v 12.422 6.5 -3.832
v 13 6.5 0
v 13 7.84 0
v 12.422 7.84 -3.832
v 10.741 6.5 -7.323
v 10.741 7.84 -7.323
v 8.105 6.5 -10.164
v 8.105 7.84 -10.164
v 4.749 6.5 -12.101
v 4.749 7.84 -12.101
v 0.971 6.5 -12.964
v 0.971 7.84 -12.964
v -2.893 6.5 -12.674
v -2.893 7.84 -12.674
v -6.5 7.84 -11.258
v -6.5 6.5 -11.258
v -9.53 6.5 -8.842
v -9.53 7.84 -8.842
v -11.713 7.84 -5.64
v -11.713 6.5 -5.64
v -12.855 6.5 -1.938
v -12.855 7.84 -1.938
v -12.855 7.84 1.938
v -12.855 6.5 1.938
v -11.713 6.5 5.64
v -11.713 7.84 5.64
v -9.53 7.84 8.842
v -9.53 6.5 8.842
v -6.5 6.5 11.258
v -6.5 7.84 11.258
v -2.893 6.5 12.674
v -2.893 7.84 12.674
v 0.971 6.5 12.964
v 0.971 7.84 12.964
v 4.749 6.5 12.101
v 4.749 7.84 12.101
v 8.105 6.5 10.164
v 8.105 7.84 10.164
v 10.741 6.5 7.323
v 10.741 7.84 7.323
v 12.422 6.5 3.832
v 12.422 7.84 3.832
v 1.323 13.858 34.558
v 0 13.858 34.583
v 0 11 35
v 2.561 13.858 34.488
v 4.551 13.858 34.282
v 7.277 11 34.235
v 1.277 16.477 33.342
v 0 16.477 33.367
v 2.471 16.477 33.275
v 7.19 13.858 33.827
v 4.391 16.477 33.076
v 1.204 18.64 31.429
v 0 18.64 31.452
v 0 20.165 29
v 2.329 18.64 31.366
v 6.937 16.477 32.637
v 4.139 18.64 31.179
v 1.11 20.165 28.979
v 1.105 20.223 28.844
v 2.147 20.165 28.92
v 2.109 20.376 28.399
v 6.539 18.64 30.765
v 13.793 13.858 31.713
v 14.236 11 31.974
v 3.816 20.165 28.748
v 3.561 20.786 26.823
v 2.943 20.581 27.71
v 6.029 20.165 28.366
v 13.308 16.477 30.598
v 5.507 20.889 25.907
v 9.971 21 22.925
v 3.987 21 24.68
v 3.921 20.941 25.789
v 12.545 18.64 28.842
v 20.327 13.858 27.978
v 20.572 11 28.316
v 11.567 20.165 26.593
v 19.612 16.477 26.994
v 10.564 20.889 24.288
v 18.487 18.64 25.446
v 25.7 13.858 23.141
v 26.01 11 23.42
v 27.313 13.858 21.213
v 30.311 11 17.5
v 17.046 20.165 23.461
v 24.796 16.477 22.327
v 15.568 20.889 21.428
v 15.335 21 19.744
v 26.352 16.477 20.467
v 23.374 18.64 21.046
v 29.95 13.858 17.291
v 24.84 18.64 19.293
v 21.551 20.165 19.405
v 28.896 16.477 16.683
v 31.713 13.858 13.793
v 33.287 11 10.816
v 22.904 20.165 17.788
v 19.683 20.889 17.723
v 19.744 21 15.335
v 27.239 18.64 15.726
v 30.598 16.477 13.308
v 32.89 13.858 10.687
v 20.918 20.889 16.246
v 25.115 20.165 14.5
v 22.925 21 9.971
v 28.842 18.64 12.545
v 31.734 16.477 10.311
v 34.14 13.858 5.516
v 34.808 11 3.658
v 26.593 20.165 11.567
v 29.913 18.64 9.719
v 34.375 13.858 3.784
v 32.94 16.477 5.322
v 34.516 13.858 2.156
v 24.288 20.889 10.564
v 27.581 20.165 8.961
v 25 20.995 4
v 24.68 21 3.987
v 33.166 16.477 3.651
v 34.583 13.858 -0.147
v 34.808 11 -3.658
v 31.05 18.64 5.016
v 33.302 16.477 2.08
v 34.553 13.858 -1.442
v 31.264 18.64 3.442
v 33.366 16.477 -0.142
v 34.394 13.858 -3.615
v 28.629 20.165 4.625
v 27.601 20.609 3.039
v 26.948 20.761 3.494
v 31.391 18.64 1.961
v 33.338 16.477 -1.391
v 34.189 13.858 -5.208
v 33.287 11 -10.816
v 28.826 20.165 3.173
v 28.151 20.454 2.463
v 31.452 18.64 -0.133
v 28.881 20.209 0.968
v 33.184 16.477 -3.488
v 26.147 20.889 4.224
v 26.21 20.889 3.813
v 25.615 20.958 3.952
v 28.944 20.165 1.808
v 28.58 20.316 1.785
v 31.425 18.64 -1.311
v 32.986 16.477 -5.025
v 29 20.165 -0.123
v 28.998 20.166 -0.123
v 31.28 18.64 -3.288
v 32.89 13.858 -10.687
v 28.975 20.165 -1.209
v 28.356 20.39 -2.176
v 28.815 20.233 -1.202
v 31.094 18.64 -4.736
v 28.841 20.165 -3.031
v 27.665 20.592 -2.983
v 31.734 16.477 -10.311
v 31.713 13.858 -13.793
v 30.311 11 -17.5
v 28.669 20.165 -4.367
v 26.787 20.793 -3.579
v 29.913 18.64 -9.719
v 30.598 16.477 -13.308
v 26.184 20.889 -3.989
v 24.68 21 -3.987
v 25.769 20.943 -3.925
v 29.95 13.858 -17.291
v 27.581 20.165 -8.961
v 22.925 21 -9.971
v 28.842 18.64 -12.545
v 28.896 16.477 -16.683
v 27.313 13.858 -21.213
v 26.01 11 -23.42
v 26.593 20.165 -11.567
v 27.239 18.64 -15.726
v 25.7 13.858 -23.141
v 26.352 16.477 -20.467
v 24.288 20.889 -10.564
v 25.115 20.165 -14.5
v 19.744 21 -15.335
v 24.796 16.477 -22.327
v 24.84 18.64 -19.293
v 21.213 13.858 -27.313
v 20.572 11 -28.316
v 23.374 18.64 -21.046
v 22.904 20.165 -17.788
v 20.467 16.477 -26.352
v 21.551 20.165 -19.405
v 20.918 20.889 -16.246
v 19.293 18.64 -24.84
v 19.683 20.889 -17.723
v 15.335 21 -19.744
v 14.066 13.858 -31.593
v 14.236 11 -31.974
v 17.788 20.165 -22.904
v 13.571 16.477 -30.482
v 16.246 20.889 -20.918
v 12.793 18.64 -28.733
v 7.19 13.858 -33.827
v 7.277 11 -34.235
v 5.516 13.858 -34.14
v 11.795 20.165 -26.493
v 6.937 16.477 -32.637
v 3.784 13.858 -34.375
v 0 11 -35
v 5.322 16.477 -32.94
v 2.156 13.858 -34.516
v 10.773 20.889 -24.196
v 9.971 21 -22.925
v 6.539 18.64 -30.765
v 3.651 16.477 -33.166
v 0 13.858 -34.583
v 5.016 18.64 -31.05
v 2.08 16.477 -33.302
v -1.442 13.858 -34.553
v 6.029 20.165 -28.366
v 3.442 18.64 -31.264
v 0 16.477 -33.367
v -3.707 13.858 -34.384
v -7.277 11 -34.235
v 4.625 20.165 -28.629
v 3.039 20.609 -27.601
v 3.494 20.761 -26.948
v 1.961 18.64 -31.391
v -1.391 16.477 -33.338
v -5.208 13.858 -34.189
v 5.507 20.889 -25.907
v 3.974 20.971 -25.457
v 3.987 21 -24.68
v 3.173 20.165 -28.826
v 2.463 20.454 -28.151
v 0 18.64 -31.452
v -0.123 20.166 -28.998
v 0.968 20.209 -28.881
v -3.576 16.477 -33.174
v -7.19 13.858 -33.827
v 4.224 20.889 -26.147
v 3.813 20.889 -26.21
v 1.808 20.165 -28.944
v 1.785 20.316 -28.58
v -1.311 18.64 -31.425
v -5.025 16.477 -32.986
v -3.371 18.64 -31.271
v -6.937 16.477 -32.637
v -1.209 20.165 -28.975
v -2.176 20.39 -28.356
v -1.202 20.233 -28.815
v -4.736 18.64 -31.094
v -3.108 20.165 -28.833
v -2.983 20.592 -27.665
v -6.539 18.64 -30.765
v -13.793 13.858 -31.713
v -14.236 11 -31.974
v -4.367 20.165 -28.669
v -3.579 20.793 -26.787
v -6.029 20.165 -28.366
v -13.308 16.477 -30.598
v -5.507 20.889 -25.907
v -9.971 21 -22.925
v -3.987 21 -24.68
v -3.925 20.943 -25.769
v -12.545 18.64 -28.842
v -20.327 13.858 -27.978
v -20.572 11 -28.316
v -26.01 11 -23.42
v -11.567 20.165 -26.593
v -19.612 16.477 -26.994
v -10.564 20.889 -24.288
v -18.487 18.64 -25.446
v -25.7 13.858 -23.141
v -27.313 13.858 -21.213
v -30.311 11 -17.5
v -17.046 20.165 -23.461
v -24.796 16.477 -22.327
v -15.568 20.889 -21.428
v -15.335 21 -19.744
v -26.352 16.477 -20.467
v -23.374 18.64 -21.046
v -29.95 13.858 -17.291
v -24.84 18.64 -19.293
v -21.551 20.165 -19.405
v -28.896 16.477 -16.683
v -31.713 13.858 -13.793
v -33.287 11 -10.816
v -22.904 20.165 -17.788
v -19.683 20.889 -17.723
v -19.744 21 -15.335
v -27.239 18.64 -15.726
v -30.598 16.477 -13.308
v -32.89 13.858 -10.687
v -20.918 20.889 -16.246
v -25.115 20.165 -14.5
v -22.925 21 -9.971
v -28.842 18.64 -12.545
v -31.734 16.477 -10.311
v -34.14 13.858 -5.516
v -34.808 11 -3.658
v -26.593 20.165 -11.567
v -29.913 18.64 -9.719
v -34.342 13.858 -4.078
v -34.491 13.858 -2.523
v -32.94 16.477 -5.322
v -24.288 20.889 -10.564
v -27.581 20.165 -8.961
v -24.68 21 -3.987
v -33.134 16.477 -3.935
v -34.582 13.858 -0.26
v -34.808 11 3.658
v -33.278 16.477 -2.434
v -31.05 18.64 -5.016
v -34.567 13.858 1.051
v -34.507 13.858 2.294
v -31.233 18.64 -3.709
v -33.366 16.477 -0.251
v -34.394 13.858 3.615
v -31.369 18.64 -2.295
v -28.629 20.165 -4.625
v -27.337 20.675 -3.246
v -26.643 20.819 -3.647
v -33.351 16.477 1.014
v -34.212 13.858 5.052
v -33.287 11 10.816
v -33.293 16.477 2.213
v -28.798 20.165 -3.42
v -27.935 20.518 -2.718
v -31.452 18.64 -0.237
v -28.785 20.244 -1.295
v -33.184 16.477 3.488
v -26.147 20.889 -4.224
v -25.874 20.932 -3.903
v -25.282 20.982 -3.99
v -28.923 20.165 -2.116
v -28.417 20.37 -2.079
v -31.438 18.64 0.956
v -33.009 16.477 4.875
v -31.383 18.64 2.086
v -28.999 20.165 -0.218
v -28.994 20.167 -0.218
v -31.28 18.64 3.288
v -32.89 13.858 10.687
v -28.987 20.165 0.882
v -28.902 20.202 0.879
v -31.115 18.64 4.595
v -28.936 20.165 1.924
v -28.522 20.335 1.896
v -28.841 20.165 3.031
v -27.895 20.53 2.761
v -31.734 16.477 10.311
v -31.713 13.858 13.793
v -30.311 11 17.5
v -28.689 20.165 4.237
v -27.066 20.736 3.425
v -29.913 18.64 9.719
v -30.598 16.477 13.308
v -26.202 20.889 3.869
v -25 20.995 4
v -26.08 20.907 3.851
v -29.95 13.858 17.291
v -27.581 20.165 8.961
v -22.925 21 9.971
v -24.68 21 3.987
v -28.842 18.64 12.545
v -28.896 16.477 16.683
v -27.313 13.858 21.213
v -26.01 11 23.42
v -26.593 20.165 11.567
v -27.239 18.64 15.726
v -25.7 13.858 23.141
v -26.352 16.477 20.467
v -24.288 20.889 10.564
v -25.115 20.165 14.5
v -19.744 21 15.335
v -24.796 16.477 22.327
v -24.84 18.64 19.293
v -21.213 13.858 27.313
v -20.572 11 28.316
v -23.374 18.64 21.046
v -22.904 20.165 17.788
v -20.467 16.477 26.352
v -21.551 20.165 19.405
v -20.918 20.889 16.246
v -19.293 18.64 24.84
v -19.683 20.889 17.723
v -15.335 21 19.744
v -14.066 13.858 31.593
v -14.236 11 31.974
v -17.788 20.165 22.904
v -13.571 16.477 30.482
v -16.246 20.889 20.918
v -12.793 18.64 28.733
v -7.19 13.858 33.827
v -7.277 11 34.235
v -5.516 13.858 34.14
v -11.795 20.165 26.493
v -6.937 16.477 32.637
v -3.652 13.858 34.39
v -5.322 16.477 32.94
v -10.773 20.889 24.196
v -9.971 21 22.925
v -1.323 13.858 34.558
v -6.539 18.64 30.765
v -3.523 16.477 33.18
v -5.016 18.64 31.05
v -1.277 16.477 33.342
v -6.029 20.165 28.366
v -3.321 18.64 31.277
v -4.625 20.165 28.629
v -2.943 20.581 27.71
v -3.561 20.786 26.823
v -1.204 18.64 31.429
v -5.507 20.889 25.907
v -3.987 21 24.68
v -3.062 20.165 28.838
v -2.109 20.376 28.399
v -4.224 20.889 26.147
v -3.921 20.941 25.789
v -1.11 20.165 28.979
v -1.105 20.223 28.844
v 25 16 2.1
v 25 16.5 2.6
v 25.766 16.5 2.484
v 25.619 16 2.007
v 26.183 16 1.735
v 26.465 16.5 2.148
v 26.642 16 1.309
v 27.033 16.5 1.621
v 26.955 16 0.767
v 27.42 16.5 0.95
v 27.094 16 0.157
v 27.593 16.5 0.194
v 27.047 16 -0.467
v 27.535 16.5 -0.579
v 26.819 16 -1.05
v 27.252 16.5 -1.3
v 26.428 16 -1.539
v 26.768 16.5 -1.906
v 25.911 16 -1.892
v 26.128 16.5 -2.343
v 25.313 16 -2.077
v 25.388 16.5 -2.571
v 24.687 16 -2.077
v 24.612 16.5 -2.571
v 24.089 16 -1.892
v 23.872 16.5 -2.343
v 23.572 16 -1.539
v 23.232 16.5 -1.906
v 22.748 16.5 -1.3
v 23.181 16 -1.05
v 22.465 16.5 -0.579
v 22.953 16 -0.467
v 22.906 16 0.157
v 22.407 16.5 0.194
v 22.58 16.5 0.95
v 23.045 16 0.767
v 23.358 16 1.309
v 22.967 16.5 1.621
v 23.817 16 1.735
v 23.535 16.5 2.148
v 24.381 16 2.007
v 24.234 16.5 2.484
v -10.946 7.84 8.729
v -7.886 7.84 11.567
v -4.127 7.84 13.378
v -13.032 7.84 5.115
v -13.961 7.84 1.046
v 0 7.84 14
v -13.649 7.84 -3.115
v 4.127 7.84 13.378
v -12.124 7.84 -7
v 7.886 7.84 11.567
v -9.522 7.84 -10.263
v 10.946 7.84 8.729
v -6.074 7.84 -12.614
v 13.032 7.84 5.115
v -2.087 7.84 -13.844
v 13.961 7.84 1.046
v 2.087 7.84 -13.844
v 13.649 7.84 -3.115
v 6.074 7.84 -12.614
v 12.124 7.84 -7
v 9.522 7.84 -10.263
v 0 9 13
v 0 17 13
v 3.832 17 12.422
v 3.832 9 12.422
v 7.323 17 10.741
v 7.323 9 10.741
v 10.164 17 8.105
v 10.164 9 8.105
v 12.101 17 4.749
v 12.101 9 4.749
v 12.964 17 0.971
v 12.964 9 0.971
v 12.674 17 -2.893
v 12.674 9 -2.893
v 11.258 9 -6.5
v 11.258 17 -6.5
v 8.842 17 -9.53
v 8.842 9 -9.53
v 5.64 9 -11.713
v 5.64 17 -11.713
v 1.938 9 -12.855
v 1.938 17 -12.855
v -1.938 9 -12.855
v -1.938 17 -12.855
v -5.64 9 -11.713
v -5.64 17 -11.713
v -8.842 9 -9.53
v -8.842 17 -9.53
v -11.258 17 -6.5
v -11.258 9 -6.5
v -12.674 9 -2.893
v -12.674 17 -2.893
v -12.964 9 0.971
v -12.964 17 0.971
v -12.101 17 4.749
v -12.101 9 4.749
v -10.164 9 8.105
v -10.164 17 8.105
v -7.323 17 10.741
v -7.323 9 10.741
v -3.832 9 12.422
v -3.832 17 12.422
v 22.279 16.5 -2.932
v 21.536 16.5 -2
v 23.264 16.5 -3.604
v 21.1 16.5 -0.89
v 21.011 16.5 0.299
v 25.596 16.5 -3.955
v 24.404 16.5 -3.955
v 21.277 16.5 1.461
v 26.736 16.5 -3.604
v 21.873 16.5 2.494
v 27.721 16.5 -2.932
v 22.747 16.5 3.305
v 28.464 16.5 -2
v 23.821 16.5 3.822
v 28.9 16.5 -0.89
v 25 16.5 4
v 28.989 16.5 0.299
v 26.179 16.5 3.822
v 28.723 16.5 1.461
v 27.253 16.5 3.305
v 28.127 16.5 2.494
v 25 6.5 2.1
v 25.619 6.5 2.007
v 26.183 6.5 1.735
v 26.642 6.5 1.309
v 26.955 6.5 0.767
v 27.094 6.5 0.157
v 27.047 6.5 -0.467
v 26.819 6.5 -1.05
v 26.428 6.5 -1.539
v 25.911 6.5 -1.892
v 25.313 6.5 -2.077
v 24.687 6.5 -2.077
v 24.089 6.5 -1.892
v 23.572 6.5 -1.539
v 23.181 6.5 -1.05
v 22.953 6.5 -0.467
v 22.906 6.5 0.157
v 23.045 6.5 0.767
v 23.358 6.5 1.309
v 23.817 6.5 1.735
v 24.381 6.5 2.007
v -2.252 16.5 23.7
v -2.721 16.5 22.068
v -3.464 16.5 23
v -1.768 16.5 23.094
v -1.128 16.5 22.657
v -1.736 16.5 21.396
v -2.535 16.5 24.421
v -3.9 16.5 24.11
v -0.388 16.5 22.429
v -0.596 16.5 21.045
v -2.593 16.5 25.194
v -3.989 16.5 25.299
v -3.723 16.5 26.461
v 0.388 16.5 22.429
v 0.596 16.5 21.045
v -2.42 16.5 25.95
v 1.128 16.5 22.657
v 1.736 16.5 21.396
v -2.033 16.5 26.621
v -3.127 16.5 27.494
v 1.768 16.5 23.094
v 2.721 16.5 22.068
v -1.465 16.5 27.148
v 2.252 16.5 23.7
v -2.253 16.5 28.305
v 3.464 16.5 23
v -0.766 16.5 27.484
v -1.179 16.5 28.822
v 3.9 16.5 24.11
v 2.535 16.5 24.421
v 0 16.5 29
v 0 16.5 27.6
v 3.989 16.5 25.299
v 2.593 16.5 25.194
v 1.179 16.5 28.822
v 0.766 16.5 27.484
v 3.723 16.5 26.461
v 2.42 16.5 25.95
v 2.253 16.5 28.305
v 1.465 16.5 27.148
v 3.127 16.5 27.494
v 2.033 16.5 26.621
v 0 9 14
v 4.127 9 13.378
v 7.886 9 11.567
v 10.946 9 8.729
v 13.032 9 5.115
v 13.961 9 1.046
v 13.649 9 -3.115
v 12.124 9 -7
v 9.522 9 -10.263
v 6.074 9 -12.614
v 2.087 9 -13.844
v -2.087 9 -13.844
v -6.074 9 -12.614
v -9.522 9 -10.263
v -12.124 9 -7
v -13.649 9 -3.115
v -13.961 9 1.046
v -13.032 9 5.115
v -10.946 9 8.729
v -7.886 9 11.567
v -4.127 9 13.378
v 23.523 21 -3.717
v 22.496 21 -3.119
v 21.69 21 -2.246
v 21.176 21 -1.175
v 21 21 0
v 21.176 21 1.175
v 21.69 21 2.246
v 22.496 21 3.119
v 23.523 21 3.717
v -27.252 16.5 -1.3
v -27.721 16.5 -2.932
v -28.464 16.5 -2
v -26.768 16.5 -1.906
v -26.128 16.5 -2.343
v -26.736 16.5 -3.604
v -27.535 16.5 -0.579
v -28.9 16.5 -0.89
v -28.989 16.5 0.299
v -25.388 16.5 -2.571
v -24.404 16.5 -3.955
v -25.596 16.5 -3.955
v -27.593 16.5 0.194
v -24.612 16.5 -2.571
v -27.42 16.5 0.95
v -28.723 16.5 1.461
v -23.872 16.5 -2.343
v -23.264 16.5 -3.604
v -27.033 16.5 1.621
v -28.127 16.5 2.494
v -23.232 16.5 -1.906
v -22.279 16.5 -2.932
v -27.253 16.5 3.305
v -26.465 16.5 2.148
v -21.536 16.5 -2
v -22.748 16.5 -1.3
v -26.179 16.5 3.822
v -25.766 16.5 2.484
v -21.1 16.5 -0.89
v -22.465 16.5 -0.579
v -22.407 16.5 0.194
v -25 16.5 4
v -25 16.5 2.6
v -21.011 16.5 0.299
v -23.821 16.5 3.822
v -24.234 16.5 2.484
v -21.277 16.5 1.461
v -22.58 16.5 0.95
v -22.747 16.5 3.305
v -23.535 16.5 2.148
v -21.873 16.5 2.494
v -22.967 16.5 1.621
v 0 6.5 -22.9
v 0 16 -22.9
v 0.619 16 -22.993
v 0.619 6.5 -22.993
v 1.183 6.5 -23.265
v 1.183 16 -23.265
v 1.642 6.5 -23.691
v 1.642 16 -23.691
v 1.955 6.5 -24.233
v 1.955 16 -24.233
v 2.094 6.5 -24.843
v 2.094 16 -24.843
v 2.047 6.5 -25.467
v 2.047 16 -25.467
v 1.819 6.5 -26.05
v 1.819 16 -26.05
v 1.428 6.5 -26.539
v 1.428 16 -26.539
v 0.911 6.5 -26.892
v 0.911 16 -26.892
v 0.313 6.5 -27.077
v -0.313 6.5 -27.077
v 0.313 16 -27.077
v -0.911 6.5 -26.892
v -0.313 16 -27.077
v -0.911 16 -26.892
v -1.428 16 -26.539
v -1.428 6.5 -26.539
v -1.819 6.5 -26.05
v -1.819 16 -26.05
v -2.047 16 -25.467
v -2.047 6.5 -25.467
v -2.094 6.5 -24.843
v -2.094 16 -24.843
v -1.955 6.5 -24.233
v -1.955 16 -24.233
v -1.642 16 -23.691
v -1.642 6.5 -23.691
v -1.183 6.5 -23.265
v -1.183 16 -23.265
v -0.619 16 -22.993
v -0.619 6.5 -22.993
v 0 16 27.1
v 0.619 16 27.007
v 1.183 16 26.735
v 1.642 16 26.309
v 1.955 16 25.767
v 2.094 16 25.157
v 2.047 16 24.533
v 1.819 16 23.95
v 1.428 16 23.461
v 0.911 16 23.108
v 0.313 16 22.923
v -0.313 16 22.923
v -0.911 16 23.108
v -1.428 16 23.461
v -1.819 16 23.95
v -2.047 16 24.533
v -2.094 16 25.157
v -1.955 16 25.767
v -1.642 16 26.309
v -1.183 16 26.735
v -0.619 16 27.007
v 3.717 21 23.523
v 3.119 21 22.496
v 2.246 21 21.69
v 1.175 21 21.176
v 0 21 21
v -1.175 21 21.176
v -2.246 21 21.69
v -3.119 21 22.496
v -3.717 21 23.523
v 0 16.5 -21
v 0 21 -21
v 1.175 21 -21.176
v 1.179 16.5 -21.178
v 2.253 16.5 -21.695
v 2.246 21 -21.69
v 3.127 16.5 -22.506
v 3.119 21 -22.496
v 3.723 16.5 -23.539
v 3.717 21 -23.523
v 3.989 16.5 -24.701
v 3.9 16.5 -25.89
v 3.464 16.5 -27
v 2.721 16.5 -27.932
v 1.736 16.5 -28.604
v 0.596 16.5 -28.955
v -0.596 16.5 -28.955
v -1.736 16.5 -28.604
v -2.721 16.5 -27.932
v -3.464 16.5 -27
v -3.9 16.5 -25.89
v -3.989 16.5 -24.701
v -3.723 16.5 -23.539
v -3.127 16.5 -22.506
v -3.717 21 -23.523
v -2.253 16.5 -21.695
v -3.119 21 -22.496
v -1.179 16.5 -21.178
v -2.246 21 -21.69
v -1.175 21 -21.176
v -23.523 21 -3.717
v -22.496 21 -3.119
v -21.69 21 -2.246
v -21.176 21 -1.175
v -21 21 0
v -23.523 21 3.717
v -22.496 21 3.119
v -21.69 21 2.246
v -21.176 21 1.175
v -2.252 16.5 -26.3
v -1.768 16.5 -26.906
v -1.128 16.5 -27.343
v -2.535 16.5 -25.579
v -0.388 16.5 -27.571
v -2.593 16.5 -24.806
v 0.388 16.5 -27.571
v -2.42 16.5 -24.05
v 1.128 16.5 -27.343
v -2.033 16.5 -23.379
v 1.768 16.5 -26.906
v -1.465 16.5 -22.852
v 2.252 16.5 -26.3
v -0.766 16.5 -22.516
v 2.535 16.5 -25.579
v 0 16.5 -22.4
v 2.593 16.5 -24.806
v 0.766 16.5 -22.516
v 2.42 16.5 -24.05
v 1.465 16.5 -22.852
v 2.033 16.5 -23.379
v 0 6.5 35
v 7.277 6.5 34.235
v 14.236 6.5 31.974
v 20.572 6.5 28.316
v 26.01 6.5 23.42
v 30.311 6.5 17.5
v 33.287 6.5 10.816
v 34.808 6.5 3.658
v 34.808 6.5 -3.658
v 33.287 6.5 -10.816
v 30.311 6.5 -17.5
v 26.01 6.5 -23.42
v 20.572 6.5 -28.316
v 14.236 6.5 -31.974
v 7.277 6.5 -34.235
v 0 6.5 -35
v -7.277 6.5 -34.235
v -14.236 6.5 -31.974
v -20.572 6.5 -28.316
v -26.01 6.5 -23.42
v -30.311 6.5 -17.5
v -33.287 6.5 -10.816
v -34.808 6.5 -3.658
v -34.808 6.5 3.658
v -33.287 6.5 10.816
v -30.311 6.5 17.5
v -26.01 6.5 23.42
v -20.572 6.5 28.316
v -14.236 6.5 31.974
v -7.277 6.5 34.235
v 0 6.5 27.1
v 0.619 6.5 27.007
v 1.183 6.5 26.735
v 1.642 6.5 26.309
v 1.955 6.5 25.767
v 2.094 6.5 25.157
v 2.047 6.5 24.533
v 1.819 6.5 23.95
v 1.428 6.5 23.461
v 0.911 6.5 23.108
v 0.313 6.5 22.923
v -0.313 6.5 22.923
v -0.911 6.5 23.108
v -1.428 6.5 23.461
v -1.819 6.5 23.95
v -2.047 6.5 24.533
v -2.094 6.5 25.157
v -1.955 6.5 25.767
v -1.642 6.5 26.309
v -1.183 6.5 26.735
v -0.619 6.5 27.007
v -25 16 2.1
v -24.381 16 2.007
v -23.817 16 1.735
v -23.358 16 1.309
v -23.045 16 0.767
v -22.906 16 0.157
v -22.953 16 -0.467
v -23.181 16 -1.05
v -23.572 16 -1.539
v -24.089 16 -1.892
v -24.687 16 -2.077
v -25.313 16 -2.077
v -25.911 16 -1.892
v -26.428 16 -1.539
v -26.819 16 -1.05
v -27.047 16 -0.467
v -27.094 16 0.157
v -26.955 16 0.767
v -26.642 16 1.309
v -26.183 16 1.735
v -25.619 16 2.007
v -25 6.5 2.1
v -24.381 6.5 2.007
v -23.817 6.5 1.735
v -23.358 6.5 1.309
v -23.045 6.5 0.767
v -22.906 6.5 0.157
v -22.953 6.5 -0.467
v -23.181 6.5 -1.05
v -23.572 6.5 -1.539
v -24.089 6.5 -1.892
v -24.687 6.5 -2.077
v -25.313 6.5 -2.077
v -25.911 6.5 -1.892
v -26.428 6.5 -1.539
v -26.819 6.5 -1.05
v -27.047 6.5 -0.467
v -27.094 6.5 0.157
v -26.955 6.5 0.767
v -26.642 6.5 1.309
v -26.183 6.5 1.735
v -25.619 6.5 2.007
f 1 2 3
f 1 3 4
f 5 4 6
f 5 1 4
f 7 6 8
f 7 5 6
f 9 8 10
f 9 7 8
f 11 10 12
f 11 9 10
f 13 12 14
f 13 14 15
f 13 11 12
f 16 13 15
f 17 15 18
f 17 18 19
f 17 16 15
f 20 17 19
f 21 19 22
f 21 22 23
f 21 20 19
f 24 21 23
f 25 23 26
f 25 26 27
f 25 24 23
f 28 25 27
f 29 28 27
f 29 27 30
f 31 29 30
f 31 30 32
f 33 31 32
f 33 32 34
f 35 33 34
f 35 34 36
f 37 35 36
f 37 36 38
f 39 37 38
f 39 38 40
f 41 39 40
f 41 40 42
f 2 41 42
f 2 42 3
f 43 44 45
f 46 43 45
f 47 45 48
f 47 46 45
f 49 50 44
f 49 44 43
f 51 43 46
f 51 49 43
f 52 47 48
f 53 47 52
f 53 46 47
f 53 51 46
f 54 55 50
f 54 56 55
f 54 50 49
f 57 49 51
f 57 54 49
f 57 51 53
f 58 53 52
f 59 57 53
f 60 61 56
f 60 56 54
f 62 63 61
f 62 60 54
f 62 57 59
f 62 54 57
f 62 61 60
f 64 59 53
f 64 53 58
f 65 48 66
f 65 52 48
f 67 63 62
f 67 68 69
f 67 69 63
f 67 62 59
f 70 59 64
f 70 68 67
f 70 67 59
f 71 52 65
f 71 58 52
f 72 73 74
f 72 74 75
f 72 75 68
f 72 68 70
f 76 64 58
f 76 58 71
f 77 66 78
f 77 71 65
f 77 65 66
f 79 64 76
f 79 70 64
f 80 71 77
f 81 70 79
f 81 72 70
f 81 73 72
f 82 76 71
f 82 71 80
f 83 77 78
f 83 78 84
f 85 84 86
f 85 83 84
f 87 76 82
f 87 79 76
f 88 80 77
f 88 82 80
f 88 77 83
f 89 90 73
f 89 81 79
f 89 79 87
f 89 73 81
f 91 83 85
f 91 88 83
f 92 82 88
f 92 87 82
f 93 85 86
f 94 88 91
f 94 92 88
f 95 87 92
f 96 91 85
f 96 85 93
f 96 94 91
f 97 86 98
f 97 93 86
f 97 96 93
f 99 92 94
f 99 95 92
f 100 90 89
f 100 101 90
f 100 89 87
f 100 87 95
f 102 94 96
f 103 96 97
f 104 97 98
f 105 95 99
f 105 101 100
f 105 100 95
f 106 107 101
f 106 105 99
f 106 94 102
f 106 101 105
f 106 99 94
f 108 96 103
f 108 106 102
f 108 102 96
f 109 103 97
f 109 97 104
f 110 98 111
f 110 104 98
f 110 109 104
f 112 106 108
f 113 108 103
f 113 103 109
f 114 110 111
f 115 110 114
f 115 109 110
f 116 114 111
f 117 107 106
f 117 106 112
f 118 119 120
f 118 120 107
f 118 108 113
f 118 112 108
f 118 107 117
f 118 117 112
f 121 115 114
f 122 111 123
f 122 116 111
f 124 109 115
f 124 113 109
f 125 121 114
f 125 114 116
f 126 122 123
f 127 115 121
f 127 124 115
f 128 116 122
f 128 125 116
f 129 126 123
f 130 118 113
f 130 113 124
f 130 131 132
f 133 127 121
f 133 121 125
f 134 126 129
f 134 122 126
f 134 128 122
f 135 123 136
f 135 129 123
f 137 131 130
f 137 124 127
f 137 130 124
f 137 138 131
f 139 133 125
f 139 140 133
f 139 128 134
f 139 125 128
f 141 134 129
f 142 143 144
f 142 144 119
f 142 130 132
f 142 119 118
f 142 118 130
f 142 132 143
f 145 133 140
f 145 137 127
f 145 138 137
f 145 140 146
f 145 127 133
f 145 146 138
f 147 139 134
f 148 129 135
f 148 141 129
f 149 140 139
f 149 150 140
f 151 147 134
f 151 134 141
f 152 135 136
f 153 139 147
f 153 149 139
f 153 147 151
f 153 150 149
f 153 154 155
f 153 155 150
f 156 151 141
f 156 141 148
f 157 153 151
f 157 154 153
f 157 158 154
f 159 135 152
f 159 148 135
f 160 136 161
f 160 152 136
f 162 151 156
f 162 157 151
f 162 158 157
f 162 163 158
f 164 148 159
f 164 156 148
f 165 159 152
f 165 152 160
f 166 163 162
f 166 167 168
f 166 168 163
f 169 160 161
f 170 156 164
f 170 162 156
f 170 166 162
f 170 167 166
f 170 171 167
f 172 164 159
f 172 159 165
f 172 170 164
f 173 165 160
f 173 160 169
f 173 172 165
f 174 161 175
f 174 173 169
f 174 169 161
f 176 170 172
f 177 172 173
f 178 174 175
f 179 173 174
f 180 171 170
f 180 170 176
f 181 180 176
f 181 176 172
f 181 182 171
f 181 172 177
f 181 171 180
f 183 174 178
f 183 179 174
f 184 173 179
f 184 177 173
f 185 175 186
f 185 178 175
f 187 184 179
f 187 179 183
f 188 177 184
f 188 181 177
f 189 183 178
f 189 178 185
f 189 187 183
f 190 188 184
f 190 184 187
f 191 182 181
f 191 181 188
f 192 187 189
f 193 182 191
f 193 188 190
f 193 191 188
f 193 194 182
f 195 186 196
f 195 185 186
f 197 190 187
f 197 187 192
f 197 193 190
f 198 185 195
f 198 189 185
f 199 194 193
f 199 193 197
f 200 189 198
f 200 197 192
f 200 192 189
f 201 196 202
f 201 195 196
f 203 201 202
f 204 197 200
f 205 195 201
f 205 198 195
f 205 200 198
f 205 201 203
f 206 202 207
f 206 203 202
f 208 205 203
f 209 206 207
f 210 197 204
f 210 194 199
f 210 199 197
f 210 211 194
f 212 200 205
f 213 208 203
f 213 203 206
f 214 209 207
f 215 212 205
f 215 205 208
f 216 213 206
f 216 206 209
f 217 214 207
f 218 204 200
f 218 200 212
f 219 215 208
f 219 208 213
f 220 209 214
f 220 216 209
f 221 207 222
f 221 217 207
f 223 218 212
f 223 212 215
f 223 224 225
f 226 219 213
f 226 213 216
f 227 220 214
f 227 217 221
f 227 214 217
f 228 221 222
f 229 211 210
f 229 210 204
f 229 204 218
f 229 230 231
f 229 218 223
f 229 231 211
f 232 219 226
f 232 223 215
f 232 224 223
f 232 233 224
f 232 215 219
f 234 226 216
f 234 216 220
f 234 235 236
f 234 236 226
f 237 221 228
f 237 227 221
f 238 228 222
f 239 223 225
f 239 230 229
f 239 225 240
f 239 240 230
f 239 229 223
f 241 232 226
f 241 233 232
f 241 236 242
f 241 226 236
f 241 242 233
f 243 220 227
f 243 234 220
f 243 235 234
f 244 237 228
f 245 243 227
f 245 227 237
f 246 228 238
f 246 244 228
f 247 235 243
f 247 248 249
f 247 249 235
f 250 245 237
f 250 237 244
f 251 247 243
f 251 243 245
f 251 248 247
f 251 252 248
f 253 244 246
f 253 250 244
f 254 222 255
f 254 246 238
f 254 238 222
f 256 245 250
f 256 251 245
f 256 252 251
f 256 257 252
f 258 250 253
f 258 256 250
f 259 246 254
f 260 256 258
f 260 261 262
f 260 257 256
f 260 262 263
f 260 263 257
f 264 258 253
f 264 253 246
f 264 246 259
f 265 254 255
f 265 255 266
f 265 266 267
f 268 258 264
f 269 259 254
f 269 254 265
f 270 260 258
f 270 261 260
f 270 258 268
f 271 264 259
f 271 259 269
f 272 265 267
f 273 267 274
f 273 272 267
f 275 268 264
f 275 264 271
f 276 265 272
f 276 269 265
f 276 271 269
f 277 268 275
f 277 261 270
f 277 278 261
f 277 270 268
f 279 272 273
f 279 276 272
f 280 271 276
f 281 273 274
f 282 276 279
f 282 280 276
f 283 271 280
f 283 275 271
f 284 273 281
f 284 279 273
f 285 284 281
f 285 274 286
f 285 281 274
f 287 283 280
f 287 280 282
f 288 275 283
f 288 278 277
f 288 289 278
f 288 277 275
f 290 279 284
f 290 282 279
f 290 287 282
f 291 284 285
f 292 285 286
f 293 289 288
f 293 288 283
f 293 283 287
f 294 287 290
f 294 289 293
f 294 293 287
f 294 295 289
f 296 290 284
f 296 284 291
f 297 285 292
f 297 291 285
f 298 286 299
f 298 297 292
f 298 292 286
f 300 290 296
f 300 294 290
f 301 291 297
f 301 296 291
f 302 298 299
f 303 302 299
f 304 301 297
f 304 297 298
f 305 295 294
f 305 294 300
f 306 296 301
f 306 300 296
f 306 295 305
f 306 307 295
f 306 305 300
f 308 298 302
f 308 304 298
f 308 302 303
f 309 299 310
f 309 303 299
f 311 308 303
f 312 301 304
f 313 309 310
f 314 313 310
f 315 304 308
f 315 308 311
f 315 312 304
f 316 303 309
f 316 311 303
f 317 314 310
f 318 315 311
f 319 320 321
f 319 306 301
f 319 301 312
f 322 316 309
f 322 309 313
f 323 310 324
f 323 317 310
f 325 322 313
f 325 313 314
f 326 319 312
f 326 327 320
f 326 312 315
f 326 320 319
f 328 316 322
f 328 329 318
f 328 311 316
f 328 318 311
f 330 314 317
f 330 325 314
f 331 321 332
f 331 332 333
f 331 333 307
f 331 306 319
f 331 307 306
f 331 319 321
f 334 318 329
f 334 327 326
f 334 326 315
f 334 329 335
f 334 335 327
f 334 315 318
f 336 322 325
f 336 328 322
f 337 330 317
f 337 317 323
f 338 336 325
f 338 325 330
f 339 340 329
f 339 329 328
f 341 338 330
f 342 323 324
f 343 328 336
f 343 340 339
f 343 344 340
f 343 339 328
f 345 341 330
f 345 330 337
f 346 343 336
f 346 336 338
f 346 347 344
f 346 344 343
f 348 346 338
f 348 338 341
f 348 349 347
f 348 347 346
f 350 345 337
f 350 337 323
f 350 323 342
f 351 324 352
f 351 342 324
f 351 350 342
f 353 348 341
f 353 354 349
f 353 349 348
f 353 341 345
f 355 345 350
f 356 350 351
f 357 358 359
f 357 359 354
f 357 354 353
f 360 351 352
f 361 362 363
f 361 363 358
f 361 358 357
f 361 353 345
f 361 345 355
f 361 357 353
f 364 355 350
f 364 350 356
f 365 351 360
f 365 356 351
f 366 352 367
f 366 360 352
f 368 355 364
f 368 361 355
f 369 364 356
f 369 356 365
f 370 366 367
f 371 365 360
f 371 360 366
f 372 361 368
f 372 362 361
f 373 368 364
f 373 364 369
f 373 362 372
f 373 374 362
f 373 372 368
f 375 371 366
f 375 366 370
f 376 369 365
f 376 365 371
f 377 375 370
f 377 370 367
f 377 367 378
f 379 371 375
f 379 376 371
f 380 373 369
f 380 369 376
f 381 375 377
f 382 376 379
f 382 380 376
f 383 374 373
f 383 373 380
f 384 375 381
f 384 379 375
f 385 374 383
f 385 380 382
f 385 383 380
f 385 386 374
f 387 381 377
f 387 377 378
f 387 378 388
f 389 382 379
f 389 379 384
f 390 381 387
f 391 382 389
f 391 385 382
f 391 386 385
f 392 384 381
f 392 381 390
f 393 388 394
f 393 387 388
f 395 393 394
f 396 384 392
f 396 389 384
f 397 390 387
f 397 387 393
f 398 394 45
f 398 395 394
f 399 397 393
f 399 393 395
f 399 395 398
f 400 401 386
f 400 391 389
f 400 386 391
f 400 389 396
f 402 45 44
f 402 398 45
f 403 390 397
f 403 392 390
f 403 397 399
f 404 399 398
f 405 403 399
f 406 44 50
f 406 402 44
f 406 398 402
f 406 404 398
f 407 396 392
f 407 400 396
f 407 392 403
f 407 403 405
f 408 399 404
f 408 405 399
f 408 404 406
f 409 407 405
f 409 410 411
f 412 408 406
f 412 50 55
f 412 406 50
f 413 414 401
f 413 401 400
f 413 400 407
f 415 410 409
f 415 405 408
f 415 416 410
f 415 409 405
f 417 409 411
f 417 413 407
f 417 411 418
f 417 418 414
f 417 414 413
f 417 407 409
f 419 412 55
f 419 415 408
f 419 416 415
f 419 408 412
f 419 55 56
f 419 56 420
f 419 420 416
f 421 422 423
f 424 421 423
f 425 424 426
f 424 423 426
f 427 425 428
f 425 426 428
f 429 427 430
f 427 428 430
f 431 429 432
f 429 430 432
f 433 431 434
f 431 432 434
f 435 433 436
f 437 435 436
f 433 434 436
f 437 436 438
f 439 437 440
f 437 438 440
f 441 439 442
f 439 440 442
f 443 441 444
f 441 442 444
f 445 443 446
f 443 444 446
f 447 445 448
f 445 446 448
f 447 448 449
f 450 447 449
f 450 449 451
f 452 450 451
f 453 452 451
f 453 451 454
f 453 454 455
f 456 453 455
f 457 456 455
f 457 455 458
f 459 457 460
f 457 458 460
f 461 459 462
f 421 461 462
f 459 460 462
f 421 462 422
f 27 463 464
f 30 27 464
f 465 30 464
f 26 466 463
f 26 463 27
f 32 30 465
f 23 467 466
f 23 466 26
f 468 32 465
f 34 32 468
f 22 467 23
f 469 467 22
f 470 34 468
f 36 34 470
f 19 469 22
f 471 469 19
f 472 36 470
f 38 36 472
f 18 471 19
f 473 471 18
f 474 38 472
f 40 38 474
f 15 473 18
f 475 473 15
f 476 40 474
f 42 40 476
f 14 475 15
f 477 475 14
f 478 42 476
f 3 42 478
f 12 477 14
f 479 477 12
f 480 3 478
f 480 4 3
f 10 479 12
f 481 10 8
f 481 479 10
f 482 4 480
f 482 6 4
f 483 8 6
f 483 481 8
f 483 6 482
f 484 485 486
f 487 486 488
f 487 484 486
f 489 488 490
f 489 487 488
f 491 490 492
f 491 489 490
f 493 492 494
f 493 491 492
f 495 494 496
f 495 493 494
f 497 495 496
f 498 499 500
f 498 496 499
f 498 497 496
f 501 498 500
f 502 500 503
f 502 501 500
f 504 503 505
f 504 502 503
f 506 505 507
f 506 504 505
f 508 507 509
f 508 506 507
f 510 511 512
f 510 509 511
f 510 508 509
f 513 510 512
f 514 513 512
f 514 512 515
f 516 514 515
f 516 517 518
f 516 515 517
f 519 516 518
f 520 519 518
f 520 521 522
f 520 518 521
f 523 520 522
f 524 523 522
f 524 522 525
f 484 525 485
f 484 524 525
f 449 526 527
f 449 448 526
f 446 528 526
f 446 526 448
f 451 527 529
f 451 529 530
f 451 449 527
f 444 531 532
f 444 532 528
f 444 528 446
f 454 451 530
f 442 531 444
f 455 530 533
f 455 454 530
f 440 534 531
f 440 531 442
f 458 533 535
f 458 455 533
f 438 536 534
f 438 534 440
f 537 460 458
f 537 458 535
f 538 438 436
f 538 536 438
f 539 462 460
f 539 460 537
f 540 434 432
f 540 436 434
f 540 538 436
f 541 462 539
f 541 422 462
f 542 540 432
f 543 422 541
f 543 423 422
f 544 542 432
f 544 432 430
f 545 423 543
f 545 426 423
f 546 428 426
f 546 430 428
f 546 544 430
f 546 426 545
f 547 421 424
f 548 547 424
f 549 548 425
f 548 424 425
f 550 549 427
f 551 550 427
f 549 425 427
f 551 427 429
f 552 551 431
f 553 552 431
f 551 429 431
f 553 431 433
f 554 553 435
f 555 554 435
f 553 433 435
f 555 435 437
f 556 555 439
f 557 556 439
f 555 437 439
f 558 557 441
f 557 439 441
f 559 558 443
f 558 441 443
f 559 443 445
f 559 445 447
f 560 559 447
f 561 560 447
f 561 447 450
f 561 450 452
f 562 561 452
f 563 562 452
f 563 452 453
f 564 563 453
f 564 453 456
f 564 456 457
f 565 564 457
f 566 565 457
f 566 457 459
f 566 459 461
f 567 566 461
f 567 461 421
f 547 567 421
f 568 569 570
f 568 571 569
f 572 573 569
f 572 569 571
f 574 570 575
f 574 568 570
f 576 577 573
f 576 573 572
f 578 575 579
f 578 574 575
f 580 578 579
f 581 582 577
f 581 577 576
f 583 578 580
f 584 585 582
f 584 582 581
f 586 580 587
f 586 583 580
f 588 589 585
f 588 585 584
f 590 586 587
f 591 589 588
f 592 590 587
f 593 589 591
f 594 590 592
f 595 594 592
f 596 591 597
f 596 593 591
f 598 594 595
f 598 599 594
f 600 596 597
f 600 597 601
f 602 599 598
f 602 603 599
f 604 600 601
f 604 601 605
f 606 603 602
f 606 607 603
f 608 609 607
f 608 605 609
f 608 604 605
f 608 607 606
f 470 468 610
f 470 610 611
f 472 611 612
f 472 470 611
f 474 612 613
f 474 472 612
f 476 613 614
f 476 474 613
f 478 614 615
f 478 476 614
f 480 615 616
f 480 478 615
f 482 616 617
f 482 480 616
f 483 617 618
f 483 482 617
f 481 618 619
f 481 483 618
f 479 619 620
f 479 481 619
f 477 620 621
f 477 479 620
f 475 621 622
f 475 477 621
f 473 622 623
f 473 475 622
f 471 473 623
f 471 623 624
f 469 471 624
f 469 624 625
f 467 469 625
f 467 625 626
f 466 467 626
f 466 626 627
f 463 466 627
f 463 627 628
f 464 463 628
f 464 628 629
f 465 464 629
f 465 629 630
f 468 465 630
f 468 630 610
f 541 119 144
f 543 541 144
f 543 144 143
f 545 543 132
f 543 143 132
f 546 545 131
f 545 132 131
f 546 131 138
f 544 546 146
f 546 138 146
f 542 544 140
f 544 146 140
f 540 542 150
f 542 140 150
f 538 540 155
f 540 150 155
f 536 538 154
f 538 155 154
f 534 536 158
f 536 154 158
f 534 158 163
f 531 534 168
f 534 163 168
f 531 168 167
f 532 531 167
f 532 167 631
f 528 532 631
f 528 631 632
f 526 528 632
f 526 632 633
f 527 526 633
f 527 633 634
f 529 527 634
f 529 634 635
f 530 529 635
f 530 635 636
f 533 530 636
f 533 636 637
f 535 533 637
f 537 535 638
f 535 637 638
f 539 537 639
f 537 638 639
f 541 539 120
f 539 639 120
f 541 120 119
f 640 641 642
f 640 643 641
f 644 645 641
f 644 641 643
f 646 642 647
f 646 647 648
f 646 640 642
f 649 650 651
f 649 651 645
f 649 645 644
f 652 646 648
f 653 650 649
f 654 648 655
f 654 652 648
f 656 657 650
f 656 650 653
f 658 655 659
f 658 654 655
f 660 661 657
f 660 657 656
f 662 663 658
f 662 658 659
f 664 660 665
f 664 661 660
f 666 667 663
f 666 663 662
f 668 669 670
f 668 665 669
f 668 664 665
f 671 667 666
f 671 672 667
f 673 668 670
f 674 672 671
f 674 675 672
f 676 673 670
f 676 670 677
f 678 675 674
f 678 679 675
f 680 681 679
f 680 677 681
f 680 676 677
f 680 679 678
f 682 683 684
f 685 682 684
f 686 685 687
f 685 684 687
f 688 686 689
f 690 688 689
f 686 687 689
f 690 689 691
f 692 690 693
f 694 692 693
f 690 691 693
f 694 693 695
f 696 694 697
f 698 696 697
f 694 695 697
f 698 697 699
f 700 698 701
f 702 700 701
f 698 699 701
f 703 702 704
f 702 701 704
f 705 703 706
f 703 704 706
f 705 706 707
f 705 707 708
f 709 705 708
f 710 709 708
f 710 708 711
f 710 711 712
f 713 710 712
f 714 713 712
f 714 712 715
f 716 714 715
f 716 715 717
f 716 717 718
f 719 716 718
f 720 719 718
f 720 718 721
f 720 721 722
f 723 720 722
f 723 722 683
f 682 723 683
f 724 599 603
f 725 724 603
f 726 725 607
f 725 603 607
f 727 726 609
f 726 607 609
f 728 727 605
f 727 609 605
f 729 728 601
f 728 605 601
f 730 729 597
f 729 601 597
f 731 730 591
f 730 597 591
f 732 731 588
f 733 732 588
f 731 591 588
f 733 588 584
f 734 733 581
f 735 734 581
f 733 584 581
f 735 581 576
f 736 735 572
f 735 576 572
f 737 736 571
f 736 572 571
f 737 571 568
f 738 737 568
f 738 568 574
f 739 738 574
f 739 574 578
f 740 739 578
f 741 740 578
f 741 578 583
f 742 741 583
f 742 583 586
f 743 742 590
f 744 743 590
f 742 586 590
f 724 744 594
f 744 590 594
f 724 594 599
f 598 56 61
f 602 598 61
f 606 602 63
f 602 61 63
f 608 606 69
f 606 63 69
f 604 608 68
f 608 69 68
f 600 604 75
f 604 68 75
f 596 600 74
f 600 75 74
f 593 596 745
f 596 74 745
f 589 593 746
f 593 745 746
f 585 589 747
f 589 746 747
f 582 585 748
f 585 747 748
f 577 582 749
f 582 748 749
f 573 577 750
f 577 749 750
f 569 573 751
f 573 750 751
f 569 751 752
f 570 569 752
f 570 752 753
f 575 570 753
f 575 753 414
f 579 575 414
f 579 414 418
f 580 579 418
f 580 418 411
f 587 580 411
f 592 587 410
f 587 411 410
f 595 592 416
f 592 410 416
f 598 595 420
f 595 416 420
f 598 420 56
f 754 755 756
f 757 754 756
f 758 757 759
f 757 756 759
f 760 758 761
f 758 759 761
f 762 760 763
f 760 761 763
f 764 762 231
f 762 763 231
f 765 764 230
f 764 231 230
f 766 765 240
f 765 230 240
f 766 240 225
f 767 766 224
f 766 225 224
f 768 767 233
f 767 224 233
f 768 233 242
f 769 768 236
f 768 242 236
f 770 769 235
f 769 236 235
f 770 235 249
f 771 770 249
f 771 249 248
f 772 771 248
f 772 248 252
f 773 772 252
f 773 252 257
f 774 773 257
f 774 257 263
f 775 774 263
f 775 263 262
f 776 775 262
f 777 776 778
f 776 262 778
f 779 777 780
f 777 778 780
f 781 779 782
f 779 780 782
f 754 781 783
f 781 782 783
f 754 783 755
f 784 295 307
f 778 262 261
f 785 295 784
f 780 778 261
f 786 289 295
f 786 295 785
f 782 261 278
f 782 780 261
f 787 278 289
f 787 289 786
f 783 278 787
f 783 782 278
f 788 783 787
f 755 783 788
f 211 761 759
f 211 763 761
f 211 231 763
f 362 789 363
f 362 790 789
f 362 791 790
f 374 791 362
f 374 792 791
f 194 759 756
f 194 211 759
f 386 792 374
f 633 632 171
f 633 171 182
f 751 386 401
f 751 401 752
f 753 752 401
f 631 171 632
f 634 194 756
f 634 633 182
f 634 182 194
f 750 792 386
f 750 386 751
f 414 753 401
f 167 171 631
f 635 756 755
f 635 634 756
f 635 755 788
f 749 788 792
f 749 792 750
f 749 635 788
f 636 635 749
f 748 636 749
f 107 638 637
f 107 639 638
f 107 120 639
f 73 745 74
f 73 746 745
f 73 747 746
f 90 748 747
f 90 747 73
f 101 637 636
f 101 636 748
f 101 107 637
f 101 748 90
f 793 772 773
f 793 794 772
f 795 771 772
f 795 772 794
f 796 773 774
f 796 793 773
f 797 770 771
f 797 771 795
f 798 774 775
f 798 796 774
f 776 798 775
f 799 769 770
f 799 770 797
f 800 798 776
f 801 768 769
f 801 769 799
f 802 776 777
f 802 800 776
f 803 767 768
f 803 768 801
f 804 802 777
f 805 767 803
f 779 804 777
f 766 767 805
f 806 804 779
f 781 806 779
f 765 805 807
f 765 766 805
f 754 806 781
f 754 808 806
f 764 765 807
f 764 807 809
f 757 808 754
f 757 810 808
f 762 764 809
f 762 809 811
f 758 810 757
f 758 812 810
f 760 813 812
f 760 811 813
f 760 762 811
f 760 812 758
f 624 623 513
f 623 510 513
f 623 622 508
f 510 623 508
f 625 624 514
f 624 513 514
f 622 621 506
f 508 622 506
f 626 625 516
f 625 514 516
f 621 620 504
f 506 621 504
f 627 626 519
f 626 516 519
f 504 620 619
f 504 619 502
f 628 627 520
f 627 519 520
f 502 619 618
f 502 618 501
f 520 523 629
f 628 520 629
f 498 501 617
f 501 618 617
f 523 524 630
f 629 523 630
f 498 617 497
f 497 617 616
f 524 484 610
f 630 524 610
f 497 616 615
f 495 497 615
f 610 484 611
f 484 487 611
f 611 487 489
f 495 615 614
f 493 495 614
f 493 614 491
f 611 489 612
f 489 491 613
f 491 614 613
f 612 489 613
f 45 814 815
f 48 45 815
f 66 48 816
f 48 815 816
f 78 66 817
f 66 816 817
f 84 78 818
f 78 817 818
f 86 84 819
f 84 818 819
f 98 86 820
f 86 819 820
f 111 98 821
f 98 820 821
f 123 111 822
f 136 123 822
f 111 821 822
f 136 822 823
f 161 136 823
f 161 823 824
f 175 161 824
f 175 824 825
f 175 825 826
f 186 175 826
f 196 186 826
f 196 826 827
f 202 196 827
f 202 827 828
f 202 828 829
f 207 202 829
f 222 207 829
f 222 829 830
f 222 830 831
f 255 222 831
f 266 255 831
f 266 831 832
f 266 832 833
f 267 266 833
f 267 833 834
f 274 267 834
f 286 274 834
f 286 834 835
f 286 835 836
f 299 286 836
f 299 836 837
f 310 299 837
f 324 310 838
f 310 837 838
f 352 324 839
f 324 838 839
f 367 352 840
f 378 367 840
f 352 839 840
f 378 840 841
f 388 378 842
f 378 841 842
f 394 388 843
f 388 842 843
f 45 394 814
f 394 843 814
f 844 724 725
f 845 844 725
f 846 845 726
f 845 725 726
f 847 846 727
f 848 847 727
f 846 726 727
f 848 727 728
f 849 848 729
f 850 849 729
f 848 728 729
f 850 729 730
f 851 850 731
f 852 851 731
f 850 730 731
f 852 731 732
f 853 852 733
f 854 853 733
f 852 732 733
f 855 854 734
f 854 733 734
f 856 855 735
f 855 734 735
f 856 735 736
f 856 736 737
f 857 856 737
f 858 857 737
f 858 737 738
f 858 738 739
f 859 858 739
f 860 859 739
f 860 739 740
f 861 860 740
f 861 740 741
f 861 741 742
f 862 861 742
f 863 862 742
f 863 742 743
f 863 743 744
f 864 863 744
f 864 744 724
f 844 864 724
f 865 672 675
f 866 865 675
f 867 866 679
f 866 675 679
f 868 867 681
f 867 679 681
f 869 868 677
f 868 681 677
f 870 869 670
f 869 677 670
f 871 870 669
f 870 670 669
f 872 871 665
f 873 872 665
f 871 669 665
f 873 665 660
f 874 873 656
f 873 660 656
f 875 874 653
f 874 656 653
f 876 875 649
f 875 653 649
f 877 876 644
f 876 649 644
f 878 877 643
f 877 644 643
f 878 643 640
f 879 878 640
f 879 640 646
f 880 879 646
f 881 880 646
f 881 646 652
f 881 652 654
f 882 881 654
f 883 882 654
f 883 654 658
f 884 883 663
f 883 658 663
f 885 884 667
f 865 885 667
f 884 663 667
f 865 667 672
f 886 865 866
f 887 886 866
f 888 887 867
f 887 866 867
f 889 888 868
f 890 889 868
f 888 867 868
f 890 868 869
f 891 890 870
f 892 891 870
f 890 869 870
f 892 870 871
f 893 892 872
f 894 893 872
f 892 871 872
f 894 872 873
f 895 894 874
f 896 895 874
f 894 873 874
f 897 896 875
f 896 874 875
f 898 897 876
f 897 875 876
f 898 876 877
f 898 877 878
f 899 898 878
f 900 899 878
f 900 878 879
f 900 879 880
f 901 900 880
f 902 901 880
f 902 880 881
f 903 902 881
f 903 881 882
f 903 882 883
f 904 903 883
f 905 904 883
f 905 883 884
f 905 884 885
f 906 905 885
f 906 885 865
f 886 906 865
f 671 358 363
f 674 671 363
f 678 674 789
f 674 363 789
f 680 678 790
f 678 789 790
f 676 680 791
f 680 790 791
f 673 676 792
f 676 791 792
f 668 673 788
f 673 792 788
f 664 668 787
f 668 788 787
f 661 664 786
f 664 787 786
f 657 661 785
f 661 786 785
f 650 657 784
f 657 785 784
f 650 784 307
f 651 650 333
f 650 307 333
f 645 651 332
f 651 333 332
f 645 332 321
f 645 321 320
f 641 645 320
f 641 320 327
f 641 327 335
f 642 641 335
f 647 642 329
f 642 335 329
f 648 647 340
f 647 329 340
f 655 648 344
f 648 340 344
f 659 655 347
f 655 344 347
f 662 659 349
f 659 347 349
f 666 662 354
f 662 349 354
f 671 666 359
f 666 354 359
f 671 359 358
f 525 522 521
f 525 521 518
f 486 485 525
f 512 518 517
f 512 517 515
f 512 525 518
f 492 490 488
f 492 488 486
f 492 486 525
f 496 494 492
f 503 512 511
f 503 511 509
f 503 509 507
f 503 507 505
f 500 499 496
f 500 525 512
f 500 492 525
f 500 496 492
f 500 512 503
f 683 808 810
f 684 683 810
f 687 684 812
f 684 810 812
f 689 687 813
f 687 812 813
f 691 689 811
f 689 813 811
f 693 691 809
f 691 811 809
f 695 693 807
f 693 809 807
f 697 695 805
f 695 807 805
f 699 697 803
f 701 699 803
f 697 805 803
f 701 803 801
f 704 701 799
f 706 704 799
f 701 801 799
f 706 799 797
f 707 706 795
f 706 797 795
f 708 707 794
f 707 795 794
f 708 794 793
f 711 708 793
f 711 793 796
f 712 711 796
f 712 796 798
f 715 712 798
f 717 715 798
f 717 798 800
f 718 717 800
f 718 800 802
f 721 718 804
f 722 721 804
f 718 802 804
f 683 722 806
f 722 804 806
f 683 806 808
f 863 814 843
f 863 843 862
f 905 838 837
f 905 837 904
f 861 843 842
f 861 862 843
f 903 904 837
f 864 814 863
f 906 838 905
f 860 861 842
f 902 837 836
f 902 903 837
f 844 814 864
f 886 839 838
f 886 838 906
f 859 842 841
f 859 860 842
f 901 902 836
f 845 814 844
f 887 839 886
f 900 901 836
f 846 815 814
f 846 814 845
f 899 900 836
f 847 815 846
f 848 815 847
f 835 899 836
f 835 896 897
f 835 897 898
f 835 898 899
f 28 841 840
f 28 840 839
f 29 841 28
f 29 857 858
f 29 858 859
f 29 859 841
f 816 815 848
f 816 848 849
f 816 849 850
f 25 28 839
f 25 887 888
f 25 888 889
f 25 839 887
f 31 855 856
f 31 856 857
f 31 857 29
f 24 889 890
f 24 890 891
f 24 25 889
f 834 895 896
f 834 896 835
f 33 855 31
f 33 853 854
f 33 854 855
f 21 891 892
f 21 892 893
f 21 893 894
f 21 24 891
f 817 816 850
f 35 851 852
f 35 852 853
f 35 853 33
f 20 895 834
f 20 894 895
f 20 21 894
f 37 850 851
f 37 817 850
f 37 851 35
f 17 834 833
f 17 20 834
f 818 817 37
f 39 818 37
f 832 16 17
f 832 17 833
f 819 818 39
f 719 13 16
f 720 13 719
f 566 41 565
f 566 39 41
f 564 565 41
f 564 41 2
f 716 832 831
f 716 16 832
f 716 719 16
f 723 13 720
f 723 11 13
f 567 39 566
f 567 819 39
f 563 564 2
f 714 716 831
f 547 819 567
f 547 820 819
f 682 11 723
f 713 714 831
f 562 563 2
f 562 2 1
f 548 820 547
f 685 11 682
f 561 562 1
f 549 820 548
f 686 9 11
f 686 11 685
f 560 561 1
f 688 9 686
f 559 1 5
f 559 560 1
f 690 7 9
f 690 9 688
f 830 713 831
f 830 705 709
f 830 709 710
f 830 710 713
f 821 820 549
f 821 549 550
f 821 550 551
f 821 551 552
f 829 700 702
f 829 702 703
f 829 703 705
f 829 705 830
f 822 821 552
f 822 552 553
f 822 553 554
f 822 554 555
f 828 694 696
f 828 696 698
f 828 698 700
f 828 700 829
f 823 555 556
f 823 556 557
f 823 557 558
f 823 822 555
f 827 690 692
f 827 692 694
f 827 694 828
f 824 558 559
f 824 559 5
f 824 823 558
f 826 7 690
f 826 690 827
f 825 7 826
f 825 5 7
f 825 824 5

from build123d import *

# Parameters (mm, degrees)
BOSS_EXTRUDE1_START       = 3
SKETCH1_R                 = 35
SKETCH1_R_2               = 14
BOSS_EXTRUDE1_DEPTH       = 18
BOSS_EXTRUDE2_START       = 18
SKETCH1_3_R               = 14
BOSS_EXTRUDE2_DEPTH       = 3
BOSS_EXTRUDE3_START       = 9
SKETCH1_4_R               = 14
SKETCH1_4_R_2             = 13
BOSS_EXTRUDE3_DEPTH       = 9
CUT_EXTRUDE1_REACH        = 54.669
SKETCH2_R                 = 2.1
SKETCH2_3_R               = 4
SKETCH2_3_R_2             = 2.1
CUT_EXTRUDE2_DEPTH        = 4.5
CHAMFER1_SIZE             = 0.5
BOSS_EXTRUDE4_START       = 3
BOSS_EXTRUDE4_OUTLINE_R   = 14
BOSS_EXTRUDE4_OUTLINE_R_2 = 13
BOSS_EXTRUDE4_DEPTH       = 4.84
BOSS_EXTRUDE5_START       = 1
SKETCH3_R                 = 13
BOSS_EXTRUDE5_DEPTH       = 1
SKETCH4_R                 = 35
CUT_EXTRUDE3_DEPTH        = 3.5
FILLET1_R                 = 10


# Read off the part's stored shape, not the designer's step: Boss-Extrude4
with BuildPart() as part:
    # Sketch1 → Boss-Extrude1 (new body)
    with BuildSketch(Plane(origin=(0, 0, 0), x_dir=(1, 0, 0), z_dir=(0, 1, 0)).offset(BOSS_EXTRUDE1_START)):
        with Locations(Location((0, 0, 0), (0, 0, 270))):
            Circle(SKETCH1_R)
        with Locations(Location((0, 0, 0), (0, 0, 270))):
            Circle(SKETCH1_R_2, mode=Mode.SUBTRACT)
    extrude(amount=BOSS_EXTRUDE1_DEPTH)

    # Sketch1<3> → Boss-Extrude2 (add)
    with BuildSketch(Plane(origin=(0, 0, 0), x_dir=(1, 0, 0), z_dir=(0, 1, 0)).offset(BOSS_EXTRUDE2_START)):
        with Locations(Location((0, 0, 0), (0, 0, 270))):
            Circle(SKETCH1_3_R)
    extrude(amount=BOSS_EXTRUDE2_DEPTH)

    # Sketch1<4> → Boss-Extrude3 (add)
    with BuildSketch(Plane(origin=(0, 0, 0), x_dir=(1, 0, 0), z_dir=(0, 1, 0)).offset(BOSS_EXTRUDE3_START)):
        with Locations(Location((0, 0, 0), (0, 0, 270))):
            Circle(SKETCH1_4_R)
        with Locations(Location((0, 0, 0), (0, 0, 270))):
            Circle(SKETCH1_4_R_2, mode=Mode.SUBTRACT)
    extrude(amount=BOSS_EXTRUDE3_DEPTH)

    # Sketch2 → Cut-Extrude1 (cut, up to next)
    with BuildSketch(Plane(origin=(0, 21, 0), x_dir=(1, 0, 0), z_dir=(0, 1, 0)), mode=Mode.PRIVATE) as cut_extrude1_sk1:
        with Locations(Location((0, -25, 0), (0, 0, 270))):
            Circle(SKETCH2_R)
    cut_extrude1_tool1 = extrude(cut_extrude1_sk1.sketch, amount=-CUT_EXTRUDE1_REACH, mode=Mode.PRIVATE) & part.part
    # Sketch2 → Cut-Extrude1 (cut, up to next)
    with BuildSketch(Plane(origin=(0, 21, 0), x_dir=(1, 0, 0), z_dir=(0, 1, 0)), mode=Mode.PRIVATE) as cut_extrude1_sk2:
        with Locations(Location((-25, 0, 0), (0, 0, 270))):
            Circle(SKETCH2_R)
    cut_extrude1_tool2 = extrude(cut_extrude1_sk2.sketch, amount=-CUT_EXTRUDE1_REACH, mode=Mode.PRIVATE) & part.part
    # Sketch2 → Cut-Extrude1 (cut, up to next)
    with BuildSketch(Plane(origin=(0, 21, 0), x_dir=(1, 0, 0), z_dir=(0, 1, 0)), mode=Mode.PRIVATE) as cut_extrude1_sk3:
        with Locations(Location((25, 0, 0), (0, 0, 270))):
            Circle(SKETCH2_R)
    cut_extrude1_tool3 = extrude(cut_extrude1_sk3.sketch, amount=-CUT_EXTRUDE1_REACH, mode=Mode.PRIVATE) & part.part
    # Sketch2 → Cut-Extrude1 (cut, up to next)
    with BuildSketch(Plane(origin=(0, 21, 0), x_dir=(1, 0, 0), z_dir=(0, 1, 0)), mode=Mode.PRIVATE) as cut_extrude1_sk4:
        with Locations(Location((0, 25, 0), (0, 0, 270))):
            Circle(SKETCH2_R)
    cut_extrude1_tool4 = extrude(cut_extrude1_sk4.sketch, amount=-CUT_EXTRUDE1_REACH, mode=Mode.PRIVATE) & part.part
    add(cut_extrude1_tool1.solids().sort_by_distance((0, 21, 25))[0], mode=Mode.SUBTRACT)
    add(cut_extrude1_tool2.solids().sort_by_distance((-25, 21, 0))[0], mode=Mode.SUBTRACT)
    add(cut_extrude1_tool3.solids().sort_by_distance((25, 21, 0))[0], mode=Mode.SUBTRACT)
    add(cut_extrude1_tool4.solids().sort_by_distance((0, 21, -25))[0], mode=Mode.SUBTRACT)

    # Sketch2<3> → Cut-Extrude2 (cut)
    # profile 1 of 4: a face of its own
    with BuildSketch(Plane(origin=(0, 21, 0), x_dir=(1, 0, 0), z_dir=(0, 1, 0))):
        with Locations(Location((0, -25, 0), (0, 0, 270))):
            Circle(SKETCH2_3_R)
        with Locations(Location((0, -25, 0), (0, 0, 270))):
            Circle(SKETCH2_3_R_2, mode=Mode.SUBTRACT)
    # profile 2 of 4: a face of its own
    with BuildSketch(Plane(origin=(0, 21, 0), x_dir=(1, 0, 0), z_dir=(0, 1, 0))):
        with Locations(Location((-25, 0, 0), (0, 0, 270))):
            Circle(SKETCH2_3_R)
        with Locations(Location((-25, 0, 0), (0, 0, 270))):
            Circle(SKETCH2_3_R_2, mode=Mode.SUBTRACT)
    # profile 3 of 4: a face of its own
    with BuildSketch(Plane(origin=(0, 21, 0), x_dir=(1, 0, 0), z_dir=(0, 1, 0))):
        with Locations(Location((0, 25, 0), (0, 0, 270))):
            Circle(SKETCH2_3_R)
        with Locations(Location((0, 25, 0), (0, 0, 270))):
            Circle(SKETCH2_3_R_2, mode=Mode.SUBTRACT)
    # profile 4 of 4: a face of its own
    with BuildSketch(Plane(origin=(0, 21, 0), x_dir=(1, 0, 0), z_dir=(0, 1, 0))):
        with Locations(Location((25, 0, 0), (0, 0, 270))):
            Circle(SKETCH2_3_R)
        with Locations(Location((25, 0, 0), (0, 0, 270))):
            Circle(SKETCH2_3_R_2, mode=Mode.SUBTRACT)
    extrude(amount=-CUT_EXTRUDE2_DEPTH, mode=Mode.SUBTRACT)

    # Chamfer1
    chamfer1_edges = [part.edges().sort_by_distance(p)[0] for p in [
        (0, 16.5, 22.9),
        (-25, 16.5, -2.1),
        (0, 16.5, -27.1),
        (25, 16.5, -2.1),
    ]]
    chamfer(chamfer1_edges, length=CHAMFER1_SIZE)

    # Boss-Extrude4 outline → Boss-Extrude4 (add)
    with BuildSketch(Plane(origin=(0, 0, 0), x_dir=(1, 0, 0), z_dir=(0, 1, 0)).offset(BOSS_EXTRUDE4_START)):
        Circle(BOSS_EXTRUDE4_OUTLINE_R)
        Circle(BOSS_EXTRUDE4_OUTLINE_R_2, mode=Mode.SUBTRACT)
    extrude(amount=BOSS_EXTRUDE4_DEPTH)

    # Sketch3 → Boss-Extrude5 (add)
    with BuildSketch(Plane.XZ.offset(-18).offset(BOSS_EXTRUDE5_START)):
        with Locations(Location((0, 0, 0), (0, 0, 270))):
            Circle(SKETCH3_R)
    extrude(amount=-BOSS_EXTRUDE5_DEPTH)

    # Sketch4 → Cut-Extrude3 (cut)
    with BuildSketch(Plane.XZ.offset(-3)):
        with Locations(Location((0, 0, 0), (0, 0, 270))):
            Circle(SKETCH4_R)
    extrude(amount=-CUT_EXTRUDE3_DEPTH, mode=Mode.SUBTRACT)

    # Fillet1
    # the kernel refuses this fillet: 10 mm, written as the material it takes off along each edge
    with BuildSketch(Plane(origin=(0, 21, 0), x_dir=(0, 0, 1), z_dir=(-1, 0, 0))) as fillet1_piece_1:
        with BuildLine():
            CenterArc((35 - FILLET1_R, -FILLET1_R), FILLET1_R, 0, 90)
            Line((35, -FILLET1_R), (35, 0))
            Line((35, 0), (35 - FILLET1_R, 0))
        make_face()
    revolve(axis=Axis((0, 21, 0), (0, 1, 0)), mode=Mode.SUBTRACT)


solid = part.part
